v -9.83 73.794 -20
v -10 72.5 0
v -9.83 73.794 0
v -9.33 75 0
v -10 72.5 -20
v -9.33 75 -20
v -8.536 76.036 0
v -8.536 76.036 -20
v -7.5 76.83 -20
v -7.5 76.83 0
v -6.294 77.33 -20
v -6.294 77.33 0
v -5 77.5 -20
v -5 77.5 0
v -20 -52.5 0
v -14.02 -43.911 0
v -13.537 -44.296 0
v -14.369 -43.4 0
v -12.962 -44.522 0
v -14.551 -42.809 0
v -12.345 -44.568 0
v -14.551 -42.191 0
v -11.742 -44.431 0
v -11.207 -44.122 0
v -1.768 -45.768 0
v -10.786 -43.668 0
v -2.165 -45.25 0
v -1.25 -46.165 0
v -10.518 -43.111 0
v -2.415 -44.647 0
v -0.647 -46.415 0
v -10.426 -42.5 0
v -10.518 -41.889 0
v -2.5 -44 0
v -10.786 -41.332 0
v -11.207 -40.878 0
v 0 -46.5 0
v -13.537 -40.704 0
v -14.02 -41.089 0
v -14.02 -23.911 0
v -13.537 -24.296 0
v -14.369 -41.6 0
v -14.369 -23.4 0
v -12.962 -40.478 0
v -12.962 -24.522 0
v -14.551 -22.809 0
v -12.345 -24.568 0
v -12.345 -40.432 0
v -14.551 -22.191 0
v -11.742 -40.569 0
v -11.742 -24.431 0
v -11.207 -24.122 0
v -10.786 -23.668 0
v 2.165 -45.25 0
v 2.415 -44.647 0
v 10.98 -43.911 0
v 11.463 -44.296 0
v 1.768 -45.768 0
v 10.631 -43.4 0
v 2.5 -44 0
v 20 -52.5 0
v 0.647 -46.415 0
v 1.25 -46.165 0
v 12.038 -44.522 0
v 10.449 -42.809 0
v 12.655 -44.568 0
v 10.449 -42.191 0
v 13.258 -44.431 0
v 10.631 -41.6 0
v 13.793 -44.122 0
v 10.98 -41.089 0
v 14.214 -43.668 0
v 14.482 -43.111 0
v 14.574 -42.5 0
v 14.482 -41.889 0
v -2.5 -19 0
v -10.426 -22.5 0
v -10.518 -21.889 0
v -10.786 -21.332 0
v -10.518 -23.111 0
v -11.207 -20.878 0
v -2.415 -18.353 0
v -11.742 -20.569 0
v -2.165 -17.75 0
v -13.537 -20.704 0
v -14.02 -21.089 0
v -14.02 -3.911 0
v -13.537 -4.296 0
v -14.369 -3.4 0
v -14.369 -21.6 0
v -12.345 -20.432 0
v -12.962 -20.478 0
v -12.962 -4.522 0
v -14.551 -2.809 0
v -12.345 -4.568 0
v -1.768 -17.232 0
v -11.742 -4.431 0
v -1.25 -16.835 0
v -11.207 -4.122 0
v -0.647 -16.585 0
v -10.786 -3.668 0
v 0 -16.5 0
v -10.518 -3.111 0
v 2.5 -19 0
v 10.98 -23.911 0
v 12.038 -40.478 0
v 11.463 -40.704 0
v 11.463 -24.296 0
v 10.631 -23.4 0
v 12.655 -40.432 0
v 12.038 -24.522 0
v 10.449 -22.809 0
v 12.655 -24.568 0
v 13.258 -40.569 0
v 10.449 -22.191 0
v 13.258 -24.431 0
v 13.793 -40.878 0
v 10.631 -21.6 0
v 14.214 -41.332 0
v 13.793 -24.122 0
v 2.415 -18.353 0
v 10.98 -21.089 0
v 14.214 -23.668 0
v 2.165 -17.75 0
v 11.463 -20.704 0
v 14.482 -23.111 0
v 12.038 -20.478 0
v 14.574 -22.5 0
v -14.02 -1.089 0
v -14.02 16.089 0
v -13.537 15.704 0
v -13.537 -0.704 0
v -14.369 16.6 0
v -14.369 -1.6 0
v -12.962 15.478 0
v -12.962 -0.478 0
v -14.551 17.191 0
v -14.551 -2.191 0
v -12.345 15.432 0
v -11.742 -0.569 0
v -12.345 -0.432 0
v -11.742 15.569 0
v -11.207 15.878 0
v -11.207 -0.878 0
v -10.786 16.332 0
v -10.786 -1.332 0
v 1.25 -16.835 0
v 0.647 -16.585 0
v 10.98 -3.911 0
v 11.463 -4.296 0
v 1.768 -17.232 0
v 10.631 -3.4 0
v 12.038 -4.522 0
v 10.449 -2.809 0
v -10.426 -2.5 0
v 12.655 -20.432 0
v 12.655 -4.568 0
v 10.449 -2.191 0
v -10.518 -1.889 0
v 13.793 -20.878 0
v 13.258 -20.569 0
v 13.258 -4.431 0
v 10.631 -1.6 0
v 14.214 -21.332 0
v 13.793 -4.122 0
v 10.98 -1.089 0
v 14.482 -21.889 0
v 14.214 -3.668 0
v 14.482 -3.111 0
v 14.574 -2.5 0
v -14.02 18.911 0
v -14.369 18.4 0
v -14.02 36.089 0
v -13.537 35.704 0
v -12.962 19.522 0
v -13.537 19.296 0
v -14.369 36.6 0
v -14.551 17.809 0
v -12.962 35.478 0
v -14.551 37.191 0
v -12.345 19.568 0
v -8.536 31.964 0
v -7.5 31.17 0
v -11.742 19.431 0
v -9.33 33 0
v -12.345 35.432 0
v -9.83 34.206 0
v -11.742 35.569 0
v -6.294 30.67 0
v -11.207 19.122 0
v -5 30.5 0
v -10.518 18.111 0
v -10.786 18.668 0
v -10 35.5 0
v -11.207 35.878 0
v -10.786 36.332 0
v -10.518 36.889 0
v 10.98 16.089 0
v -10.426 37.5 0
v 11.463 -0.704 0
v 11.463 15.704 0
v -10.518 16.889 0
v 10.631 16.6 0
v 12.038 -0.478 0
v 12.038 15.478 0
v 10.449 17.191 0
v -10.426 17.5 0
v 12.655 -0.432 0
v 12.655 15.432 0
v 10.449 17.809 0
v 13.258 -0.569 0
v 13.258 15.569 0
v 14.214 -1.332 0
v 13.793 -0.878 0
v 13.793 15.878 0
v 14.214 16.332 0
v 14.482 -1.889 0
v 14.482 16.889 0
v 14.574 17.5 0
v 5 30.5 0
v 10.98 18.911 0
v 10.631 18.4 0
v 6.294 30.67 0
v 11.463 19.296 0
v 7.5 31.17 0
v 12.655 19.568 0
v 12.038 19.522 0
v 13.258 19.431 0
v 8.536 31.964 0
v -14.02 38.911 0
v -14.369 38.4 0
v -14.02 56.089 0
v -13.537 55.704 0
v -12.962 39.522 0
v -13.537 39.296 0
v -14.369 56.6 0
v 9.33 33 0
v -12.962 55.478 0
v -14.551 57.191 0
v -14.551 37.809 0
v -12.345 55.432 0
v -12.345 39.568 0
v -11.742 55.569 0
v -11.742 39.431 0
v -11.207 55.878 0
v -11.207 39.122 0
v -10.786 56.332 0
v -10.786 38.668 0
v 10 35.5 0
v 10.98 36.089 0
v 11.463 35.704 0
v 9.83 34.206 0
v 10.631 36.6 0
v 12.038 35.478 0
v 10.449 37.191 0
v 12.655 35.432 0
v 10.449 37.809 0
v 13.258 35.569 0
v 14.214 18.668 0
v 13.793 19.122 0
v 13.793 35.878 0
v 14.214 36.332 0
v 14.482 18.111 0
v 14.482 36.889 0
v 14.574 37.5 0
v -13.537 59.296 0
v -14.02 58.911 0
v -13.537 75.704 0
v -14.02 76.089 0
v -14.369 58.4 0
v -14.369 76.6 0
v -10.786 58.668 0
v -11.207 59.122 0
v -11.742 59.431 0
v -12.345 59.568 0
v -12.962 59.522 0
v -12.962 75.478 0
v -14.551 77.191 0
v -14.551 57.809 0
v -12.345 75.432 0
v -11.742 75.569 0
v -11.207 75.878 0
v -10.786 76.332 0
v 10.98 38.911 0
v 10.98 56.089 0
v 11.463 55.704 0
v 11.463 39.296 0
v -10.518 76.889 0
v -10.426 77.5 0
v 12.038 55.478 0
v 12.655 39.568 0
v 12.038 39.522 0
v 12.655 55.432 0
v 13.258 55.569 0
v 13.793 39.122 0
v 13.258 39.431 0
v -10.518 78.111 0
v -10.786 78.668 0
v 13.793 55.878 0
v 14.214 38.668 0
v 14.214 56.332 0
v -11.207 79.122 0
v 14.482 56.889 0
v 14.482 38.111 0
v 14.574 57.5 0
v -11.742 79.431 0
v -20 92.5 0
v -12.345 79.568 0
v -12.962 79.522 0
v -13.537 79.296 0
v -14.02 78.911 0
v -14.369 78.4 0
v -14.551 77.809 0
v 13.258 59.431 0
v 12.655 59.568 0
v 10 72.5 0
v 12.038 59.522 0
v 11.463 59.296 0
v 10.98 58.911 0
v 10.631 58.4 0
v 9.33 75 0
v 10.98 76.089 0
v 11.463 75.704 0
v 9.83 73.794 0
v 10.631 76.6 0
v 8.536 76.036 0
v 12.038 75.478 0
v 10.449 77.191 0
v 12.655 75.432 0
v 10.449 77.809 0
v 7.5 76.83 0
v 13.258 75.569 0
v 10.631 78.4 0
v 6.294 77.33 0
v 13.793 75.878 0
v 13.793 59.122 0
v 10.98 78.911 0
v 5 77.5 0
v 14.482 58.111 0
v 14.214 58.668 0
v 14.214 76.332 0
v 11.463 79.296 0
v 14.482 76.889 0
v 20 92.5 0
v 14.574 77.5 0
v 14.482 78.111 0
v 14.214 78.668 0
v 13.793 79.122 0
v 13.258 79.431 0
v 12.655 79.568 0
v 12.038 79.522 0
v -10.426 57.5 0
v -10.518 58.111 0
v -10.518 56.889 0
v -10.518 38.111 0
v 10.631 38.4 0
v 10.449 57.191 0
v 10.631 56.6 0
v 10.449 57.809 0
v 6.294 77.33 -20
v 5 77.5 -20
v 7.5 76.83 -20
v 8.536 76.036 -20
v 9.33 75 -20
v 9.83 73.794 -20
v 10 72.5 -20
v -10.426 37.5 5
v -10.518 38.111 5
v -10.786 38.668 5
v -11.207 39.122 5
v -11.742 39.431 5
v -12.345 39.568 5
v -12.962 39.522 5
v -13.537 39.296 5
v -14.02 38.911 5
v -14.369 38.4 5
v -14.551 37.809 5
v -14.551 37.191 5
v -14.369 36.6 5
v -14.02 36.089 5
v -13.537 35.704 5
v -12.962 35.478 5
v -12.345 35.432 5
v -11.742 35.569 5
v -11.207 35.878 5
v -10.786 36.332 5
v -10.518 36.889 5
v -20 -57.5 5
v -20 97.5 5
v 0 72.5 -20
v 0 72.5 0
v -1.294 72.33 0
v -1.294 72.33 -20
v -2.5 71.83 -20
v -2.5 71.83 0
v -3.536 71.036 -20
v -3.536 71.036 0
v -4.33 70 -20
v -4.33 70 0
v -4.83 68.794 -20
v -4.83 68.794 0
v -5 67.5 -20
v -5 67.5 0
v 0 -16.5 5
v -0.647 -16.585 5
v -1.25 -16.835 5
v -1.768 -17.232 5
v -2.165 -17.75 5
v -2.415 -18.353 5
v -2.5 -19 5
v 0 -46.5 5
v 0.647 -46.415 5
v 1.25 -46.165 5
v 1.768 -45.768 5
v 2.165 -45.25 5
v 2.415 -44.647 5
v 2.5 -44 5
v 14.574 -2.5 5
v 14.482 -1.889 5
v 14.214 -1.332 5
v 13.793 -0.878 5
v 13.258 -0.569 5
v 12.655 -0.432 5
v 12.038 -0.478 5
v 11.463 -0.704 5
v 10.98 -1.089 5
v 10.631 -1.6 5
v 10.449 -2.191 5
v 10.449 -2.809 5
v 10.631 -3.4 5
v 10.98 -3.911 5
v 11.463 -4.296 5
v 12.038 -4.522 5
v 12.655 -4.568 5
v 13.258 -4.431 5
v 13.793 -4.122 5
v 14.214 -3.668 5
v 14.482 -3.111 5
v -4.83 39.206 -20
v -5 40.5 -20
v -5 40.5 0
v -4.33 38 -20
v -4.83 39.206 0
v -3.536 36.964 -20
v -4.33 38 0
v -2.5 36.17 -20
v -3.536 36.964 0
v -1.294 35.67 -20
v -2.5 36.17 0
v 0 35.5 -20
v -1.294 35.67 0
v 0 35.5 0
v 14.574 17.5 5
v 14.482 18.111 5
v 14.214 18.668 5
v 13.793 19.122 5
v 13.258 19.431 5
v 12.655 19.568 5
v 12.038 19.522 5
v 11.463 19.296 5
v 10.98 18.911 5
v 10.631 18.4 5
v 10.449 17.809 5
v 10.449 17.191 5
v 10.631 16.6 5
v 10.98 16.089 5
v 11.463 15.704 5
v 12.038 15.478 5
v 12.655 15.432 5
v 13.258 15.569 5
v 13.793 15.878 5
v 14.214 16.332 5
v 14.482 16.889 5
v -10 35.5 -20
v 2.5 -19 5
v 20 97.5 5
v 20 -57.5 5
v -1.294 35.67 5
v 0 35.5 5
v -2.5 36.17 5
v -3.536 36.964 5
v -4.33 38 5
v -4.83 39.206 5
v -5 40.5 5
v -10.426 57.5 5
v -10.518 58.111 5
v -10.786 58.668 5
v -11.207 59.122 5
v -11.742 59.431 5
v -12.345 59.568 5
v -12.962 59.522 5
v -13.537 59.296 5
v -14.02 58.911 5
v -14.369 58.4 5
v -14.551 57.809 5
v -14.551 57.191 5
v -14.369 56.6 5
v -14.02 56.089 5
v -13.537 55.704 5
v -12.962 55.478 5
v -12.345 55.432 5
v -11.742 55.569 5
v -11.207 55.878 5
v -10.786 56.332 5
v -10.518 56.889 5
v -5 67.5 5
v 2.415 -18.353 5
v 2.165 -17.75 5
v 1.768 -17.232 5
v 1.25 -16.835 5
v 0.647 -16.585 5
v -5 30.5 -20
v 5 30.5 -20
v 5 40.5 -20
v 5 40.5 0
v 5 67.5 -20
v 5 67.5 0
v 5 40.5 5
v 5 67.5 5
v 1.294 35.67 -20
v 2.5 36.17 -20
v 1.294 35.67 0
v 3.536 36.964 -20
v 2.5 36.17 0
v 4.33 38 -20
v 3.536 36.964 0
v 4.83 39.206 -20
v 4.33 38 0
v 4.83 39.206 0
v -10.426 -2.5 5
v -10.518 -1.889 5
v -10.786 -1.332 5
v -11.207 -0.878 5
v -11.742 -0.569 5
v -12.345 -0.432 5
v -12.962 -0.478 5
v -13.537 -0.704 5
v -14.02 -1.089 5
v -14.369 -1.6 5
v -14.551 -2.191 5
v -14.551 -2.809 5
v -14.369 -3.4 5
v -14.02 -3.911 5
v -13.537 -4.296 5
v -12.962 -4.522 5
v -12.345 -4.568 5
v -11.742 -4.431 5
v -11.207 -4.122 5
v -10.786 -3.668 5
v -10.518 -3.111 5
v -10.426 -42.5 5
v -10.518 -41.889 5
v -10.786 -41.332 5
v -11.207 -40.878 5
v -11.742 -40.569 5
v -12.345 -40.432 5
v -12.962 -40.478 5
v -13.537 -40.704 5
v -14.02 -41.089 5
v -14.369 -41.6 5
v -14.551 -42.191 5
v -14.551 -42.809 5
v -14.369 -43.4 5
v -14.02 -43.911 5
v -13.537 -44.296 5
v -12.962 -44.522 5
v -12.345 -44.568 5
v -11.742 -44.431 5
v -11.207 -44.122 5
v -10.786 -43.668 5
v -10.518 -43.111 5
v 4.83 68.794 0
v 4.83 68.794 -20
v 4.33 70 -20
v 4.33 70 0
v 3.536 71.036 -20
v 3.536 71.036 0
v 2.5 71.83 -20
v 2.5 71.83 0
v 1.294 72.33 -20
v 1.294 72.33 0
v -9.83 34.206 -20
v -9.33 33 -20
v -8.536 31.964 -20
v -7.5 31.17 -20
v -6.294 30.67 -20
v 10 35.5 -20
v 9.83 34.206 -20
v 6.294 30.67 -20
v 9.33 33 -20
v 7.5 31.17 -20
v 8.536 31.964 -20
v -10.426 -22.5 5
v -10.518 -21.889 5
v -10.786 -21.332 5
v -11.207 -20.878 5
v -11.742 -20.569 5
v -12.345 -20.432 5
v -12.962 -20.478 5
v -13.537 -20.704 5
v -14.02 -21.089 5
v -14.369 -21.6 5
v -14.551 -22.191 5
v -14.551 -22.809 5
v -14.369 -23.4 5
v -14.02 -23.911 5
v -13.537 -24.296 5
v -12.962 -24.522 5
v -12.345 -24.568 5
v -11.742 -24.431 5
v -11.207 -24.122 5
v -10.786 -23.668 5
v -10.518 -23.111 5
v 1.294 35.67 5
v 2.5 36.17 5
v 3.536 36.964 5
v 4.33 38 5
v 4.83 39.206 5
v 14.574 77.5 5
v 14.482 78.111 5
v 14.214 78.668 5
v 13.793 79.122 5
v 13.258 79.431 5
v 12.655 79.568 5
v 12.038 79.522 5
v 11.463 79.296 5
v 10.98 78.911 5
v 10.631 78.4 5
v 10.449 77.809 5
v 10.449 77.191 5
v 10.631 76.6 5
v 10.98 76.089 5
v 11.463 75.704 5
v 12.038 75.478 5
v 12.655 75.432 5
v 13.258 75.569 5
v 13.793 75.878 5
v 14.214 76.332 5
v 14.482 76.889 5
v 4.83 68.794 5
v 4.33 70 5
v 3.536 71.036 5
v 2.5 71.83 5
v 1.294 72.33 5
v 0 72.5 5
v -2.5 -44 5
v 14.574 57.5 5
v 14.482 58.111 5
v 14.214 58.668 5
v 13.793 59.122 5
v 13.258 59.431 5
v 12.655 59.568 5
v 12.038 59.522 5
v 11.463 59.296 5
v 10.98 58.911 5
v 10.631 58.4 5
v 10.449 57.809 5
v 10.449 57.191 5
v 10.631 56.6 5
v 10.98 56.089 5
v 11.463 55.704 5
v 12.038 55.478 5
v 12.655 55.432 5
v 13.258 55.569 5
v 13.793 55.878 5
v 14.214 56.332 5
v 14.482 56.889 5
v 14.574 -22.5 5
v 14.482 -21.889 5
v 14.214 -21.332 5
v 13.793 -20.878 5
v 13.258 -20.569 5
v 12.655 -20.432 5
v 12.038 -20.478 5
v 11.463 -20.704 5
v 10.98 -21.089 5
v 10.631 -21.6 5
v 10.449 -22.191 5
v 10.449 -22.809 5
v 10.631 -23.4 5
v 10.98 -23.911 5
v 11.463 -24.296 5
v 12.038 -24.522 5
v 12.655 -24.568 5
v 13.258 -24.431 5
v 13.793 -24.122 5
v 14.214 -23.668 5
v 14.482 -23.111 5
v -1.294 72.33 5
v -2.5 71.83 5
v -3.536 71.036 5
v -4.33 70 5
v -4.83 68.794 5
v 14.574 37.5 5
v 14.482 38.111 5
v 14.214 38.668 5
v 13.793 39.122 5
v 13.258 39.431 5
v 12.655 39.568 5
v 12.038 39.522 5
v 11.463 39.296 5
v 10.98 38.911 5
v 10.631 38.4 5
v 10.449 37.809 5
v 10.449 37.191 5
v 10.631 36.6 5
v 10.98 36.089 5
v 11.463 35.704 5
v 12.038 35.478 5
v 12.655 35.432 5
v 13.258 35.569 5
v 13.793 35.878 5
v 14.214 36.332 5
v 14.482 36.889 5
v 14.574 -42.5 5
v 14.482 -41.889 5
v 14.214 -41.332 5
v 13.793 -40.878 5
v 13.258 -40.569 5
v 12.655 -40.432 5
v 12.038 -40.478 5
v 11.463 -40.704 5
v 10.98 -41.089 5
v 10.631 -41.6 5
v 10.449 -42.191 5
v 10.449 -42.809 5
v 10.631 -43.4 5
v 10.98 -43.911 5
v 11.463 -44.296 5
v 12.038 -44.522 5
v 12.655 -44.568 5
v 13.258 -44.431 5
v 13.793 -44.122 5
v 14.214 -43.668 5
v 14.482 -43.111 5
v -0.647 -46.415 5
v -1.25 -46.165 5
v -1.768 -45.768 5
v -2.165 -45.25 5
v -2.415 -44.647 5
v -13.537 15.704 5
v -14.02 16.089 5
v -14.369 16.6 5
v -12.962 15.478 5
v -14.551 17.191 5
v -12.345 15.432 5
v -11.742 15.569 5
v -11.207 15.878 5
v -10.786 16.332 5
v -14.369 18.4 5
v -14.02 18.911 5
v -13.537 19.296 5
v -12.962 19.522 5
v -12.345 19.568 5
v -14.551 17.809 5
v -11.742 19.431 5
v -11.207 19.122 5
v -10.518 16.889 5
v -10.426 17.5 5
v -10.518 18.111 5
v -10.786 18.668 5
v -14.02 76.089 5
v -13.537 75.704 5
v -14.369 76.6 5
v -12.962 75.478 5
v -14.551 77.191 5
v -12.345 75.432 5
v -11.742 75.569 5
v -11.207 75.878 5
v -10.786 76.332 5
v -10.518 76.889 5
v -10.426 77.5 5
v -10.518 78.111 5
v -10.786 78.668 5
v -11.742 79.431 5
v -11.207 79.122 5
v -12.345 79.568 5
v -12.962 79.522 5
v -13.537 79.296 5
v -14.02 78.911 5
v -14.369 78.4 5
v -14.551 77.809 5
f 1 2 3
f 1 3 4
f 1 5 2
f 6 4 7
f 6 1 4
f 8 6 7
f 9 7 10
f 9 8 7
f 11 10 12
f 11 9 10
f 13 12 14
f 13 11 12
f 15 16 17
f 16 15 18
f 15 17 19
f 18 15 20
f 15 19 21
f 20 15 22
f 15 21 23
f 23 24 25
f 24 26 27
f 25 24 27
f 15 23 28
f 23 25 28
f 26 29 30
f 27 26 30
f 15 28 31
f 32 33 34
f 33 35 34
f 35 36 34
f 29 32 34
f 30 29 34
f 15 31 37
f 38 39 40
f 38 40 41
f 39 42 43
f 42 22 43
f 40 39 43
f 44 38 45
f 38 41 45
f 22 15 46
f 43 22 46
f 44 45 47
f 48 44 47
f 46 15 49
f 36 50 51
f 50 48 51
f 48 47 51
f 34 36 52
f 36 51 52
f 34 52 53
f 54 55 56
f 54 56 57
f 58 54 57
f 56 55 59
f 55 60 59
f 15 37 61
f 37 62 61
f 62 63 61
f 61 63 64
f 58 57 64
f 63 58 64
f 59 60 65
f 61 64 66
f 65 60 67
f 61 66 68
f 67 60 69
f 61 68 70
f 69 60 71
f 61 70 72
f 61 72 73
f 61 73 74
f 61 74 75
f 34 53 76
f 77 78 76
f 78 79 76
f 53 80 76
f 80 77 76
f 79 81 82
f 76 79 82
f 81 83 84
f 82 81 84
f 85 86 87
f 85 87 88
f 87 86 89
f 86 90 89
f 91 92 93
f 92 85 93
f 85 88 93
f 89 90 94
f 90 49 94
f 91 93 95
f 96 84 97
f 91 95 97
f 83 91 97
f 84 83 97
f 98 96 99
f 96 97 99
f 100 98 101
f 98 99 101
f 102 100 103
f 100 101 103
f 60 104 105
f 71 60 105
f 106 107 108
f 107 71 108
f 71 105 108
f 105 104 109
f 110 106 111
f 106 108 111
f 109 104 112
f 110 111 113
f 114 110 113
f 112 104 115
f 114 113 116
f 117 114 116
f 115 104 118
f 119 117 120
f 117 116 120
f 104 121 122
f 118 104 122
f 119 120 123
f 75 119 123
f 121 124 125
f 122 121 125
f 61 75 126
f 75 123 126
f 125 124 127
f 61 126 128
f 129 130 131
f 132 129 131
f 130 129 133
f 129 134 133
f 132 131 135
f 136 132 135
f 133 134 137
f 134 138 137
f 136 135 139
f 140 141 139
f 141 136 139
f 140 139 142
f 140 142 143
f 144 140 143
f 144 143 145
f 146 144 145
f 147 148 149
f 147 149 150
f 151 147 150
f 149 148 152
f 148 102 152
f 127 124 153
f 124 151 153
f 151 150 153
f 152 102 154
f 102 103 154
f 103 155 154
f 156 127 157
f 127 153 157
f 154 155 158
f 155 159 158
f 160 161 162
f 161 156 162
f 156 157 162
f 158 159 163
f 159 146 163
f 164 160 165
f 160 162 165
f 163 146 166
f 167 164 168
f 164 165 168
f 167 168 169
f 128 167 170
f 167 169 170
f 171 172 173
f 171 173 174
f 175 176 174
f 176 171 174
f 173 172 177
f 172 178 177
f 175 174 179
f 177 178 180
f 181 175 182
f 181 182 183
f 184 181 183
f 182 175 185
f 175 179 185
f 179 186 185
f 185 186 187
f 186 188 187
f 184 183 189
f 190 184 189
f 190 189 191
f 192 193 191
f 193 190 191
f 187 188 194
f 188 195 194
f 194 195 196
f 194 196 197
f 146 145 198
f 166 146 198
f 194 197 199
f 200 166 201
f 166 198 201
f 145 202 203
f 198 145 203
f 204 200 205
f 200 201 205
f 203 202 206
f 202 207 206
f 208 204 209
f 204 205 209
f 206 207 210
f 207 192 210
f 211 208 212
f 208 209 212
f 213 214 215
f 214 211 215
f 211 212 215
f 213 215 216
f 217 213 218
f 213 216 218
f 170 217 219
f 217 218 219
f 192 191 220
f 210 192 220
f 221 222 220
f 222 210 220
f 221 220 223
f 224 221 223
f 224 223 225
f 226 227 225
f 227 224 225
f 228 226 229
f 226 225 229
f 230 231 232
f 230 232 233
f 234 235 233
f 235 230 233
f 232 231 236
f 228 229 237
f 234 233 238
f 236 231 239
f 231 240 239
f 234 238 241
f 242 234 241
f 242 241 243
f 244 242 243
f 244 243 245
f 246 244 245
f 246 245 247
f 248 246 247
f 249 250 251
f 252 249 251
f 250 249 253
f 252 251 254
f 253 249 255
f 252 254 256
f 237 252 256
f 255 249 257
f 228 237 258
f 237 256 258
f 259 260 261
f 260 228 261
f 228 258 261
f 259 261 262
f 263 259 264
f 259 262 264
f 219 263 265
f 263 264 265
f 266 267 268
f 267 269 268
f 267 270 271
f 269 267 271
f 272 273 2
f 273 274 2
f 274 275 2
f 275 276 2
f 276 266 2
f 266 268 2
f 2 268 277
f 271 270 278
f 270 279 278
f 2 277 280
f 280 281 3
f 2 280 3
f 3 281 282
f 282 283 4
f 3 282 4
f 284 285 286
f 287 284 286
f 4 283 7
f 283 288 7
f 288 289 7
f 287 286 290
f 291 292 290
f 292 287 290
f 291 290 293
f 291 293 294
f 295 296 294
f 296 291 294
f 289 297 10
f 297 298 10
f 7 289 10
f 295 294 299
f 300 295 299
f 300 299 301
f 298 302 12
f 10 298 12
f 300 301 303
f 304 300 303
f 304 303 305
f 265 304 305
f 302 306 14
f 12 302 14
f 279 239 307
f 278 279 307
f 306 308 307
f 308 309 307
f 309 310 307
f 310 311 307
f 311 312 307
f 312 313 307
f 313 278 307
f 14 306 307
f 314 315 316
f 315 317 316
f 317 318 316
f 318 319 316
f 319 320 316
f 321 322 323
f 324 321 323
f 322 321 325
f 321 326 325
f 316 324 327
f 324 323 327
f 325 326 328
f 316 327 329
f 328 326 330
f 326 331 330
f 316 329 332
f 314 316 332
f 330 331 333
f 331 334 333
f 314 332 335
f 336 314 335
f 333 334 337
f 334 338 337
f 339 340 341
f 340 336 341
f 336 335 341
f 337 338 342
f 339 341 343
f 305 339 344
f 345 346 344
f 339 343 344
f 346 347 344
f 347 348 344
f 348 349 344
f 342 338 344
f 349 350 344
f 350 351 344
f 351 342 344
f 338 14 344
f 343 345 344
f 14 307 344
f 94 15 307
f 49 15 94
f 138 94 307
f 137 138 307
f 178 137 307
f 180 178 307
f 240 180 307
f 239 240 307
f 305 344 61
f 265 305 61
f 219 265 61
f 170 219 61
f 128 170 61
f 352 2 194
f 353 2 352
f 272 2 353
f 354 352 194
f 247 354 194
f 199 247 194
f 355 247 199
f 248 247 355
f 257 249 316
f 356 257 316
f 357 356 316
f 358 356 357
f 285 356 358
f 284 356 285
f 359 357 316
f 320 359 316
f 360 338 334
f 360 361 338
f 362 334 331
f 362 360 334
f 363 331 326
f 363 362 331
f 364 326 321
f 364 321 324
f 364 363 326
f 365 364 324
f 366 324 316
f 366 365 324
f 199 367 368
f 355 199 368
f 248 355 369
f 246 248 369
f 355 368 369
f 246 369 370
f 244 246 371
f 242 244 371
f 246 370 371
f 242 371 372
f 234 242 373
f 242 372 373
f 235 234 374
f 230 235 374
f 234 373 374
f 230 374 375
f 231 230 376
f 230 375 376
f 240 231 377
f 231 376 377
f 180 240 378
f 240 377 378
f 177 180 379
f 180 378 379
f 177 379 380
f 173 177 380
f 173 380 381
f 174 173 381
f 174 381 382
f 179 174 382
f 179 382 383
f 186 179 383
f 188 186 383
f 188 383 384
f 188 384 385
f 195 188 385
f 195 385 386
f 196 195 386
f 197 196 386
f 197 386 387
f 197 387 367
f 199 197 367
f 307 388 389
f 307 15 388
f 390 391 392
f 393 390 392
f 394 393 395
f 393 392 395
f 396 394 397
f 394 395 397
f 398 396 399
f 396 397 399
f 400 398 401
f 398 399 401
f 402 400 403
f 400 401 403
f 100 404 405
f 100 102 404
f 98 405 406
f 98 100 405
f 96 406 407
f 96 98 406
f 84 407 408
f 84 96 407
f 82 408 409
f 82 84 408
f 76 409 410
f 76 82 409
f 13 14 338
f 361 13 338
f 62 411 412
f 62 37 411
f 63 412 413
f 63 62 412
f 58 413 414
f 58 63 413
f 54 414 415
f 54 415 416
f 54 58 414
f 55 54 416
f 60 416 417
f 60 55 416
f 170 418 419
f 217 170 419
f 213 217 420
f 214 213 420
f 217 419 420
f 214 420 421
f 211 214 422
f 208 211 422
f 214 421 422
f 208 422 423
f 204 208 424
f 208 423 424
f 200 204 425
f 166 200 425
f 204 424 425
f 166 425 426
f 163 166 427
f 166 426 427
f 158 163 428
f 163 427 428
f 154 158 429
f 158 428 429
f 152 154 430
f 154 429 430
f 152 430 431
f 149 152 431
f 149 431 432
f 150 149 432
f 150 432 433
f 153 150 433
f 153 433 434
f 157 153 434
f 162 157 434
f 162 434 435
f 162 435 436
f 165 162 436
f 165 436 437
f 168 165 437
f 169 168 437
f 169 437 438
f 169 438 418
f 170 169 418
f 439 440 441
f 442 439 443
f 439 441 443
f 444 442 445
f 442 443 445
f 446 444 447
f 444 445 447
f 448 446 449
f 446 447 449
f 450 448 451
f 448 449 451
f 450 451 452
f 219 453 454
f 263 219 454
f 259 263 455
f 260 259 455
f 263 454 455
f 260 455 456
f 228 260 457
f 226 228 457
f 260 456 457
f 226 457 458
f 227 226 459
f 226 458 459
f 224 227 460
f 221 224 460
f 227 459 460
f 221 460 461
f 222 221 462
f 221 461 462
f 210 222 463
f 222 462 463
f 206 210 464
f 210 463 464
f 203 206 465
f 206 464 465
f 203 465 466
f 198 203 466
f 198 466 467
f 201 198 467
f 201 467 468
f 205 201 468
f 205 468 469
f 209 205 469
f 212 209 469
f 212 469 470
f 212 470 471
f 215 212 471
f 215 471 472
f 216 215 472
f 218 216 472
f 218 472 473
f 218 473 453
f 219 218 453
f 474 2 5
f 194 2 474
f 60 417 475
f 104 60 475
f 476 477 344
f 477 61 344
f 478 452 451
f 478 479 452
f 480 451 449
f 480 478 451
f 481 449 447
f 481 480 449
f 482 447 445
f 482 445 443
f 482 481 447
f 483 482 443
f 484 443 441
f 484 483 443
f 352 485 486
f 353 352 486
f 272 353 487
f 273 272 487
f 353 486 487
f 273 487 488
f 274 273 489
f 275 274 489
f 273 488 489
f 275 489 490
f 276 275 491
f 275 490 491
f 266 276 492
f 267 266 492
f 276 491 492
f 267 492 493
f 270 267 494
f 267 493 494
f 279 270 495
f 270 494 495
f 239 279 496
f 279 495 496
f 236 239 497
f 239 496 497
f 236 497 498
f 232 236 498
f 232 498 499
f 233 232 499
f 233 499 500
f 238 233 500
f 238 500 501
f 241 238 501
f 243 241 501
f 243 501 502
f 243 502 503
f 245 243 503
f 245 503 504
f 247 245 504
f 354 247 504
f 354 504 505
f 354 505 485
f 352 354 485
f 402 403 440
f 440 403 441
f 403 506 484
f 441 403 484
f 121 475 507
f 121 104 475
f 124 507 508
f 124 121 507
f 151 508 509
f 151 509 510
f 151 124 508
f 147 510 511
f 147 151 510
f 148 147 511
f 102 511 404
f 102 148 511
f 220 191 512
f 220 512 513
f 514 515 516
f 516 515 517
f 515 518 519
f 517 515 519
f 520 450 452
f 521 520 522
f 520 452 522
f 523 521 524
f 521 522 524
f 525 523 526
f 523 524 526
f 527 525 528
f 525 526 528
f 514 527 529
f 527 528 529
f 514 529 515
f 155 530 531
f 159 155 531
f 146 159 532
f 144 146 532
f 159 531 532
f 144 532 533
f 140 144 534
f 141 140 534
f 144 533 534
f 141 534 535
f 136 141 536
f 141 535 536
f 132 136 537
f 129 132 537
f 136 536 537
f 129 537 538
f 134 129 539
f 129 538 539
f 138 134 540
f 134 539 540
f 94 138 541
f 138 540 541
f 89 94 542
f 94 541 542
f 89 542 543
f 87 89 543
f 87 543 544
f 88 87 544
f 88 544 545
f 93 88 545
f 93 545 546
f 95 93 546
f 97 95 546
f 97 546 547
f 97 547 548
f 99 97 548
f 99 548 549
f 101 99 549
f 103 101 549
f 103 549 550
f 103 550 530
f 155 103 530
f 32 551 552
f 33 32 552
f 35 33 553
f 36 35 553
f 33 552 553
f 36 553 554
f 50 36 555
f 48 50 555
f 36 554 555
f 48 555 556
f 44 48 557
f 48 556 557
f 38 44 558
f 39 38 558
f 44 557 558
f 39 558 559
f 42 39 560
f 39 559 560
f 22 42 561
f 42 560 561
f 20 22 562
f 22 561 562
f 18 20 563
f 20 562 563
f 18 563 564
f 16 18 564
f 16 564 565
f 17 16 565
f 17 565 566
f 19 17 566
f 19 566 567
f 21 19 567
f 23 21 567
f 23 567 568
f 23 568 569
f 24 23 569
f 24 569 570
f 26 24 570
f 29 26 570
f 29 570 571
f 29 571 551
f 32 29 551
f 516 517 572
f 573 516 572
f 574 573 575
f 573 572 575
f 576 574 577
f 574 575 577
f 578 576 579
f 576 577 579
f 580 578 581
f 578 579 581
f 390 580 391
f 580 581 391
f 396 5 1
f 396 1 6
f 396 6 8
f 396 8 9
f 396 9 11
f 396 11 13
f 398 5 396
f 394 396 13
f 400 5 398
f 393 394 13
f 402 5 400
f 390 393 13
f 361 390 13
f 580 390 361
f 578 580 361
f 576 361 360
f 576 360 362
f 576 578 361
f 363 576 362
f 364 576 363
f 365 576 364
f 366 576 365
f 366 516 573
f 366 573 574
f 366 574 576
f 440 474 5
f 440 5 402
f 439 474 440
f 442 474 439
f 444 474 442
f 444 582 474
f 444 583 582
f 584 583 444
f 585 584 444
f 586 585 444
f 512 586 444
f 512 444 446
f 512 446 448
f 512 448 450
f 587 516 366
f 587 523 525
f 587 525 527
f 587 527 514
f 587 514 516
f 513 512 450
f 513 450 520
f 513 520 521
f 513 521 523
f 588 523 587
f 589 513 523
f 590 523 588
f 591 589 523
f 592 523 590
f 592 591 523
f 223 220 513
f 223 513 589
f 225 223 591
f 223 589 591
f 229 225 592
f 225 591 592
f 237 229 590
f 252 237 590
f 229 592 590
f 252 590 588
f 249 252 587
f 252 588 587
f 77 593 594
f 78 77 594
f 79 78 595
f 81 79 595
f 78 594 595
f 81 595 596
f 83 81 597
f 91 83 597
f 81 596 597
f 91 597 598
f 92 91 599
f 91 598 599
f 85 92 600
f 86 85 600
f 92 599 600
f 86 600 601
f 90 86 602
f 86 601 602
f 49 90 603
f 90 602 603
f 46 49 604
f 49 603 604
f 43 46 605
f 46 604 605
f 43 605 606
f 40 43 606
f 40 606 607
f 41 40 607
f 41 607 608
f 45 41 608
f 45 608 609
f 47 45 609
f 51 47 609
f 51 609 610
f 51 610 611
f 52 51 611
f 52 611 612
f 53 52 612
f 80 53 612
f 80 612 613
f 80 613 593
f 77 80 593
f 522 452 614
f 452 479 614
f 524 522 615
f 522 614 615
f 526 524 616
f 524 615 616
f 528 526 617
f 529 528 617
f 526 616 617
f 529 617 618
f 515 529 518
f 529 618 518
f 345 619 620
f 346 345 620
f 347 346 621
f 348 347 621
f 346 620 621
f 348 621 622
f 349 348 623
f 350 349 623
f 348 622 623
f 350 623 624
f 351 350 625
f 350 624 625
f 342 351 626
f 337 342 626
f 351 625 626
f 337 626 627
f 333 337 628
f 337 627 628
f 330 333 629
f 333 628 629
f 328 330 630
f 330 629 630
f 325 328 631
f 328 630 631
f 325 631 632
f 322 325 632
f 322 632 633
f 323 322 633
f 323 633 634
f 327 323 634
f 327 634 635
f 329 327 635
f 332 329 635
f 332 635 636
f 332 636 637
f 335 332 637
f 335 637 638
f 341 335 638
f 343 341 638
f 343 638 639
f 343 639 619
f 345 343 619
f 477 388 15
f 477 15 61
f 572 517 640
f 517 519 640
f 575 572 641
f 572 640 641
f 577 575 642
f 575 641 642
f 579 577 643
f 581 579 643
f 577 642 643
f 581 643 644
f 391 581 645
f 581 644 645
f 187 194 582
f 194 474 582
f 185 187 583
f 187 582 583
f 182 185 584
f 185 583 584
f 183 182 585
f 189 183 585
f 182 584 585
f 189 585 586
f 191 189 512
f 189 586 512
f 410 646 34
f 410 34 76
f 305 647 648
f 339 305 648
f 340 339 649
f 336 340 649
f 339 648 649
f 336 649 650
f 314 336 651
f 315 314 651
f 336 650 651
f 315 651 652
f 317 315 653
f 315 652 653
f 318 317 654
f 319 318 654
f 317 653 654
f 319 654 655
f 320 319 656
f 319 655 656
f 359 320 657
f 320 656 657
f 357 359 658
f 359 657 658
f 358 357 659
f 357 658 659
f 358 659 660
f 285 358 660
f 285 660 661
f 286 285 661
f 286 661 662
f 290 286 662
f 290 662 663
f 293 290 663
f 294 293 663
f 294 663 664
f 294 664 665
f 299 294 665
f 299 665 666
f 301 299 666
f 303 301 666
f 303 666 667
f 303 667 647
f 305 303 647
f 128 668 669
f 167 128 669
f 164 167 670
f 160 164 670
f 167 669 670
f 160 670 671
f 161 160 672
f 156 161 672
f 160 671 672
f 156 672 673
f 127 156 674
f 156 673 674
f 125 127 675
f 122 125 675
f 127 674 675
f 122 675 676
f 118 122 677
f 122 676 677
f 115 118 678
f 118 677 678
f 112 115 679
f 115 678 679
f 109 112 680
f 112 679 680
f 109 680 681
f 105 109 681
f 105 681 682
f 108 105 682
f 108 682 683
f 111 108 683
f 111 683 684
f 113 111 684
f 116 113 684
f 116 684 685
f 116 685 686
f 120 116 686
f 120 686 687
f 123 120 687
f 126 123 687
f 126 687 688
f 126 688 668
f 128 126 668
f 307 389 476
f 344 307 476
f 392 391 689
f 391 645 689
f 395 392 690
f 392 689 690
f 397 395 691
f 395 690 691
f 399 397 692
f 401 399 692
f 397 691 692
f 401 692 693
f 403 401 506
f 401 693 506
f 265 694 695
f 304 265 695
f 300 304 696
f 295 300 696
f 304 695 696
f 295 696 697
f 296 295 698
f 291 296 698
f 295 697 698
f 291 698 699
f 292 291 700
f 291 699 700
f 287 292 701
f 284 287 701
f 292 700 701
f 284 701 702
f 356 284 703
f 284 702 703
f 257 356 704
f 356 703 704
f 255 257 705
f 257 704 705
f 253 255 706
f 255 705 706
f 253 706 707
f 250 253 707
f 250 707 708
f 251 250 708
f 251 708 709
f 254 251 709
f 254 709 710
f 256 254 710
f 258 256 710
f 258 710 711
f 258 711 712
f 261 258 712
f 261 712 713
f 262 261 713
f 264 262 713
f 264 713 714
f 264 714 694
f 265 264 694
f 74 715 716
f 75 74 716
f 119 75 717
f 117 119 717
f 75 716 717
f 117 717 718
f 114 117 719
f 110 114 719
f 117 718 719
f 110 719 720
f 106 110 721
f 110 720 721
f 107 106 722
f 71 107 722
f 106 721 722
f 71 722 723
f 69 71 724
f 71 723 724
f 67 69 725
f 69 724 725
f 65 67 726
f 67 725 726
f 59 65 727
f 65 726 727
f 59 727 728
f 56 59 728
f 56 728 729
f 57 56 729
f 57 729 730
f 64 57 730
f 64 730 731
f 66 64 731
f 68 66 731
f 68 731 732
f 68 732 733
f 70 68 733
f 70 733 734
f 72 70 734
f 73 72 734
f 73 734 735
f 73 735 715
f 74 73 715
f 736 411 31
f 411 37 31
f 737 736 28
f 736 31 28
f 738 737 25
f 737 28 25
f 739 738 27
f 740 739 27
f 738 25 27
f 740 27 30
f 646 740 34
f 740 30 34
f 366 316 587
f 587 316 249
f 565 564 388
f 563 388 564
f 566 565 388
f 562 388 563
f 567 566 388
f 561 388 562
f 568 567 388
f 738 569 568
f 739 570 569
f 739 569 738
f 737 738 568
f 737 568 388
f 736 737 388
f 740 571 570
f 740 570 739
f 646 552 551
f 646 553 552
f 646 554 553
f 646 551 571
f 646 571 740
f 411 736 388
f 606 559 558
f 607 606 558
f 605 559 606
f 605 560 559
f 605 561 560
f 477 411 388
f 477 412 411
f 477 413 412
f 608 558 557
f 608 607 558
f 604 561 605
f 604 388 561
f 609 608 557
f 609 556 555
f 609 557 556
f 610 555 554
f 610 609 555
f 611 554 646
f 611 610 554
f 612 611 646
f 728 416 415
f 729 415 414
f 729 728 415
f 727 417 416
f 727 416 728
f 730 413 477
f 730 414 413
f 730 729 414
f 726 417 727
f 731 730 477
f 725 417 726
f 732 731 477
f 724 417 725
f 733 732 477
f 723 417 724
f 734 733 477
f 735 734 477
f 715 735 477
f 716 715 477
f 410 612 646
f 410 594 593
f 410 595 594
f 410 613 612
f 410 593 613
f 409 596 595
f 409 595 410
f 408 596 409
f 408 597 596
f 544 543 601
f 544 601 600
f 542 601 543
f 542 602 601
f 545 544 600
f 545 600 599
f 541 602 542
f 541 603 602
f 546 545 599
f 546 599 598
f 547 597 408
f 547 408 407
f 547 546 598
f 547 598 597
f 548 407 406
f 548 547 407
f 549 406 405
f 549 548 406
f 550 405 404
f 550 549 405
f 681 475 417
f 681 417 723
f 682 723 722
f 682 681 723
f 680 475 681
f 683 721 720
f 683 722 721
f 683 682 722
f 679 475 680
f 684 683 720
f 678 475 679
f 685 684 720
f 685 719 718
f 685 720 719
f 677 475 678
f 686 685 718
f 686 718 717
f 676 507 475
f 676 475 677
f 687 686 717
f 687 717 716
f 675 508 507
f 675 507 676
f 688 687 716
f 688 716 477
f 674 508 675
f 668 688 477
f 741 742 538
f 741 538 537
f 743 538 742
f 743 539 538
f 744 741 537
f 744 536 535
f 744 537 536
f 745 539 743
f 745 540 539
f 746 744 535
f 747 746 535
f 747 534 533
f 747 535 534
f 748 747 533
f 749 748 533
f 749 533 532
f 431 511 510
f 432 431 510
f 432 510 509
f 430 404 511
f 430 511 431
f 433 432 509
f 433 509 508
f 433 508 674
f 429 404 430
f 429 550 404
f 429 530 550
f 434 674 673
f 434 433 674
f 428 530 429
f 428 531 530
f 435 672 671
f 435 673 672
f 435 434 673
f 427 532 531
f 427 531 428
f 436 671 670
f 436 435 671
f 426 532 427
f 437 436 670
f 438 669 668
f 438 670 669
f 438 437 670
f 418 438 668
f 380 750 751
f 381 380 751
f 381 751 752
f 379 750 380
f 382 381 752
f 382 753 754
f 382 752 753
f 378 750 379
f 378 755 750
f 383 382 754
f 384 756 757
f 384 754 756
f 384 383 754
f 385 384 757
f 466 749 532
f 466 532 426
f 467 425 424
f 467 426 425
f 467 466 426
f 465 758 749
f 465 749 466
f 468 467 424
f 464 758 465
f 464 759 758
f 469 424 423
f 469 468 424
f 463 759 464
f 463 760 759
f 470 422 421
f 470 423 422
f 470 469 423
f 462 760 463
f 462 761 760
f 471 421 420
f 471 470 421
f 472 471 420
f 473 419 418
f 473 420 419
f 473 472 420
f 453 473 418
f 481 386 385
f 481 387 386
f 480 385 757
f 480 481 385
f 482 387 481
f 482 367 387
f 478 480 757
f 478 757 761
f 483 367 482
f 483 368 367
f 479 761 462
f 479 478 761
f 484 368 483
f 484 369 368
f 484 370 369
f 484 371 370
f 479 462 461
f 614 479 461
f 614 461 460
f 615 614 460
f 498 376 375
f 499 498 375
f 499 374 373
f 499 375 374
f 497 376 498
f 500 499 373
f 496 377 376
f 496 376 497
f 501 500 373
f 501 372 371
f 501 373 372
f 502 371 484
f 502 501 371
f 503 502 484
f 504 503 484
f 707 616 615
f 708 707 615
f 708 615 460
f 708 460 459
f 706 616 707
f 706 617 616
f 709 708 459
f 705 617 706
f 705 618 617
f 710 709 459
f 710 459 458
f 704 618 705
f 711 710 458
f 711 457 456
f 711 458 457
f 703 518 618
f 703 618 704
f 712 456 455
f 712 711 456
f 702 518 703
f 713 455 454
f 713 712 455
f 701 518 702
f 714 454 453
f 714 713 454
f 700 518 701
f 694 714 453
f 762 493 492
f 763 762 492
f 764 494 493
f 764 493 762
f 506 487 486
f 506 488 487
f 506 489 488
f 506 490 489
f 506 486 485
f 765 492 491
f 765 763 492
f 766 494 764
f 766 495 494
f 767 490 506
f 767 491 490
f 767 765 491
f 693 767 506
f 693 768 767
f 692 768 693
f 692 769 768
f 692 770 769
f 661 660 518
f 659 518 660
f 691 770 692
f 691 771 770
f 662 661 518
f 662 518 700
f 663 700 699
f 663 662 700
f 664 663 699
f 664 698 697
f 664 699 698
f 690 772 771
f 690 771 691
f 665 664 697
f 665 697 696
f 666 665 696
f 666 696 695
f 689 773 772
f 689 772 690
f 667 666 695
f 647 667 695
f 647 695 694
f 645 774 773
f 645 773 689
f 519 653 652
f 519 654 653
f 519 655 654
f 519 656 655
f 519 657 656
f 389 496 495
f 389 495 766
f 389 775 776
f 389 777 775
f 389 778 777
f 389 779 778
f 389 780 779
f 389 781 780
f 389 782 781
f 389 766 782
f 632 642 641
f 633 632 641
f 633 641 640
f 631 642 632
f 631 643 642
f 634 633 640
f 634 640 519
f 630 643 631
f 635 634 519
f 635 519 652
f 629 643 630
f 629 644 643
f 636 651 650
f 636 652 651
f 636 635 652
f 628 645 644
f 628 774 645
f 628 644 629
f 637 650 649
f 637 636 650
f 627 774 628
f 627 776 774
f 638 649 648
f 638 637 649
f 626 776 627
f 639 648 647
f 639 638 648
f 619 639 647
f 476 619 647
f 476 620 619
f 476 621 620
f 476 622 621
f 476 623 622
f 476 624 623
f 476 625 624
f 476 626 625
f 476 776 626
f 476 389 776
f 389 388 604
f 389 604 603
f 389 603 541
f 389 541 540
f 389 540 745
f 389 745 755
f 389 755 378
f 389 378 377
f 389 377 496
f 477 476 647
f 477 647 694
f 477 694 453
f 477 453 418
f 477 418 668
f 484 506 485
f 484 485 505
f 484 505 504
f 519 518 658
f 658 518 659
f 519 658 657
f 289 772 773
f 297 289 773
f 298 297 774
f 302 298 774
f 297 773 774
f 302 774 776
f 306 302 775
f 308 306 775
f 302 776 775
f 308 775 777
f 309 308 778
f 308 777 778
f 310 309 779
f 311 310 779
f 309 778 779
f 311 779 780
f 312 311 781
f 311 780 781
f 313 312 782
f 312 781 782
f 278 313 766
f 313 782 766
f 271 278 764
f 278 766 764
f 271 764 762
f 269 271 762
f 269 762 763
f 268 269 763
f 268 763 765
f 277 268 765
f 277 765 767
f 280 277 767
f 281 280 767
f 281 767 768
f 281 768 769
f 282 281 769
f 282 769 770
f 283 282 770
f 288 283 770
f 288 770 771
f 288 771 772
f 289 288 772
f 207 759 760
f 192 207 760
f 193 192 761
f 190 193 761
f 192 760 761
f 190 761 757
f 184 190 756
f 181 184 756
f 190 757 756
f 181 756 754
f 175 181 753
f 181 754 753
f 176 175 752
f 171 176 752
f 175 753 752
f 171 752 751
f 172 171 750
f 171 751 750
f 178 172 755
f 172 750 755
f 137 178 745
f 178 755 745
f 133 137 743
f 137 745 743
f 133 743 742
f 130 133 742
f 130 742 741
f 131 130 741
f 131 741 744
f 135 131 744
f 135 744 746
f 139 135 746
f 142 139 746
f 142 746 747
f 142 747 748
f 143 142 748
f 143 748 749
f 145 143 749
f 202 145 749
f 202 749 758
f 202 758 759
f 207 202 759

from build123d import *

# Parameters (mm, degrees)
F0_W      = 40
F0_H      = 155
F0_W_2    = 10
F0_H_2    = 37
F1_DEPTH  = 5
F2_R      = 4.99999
F3_W      = 20
F3_H      = 47
F4_DEPTH  = 20
F5_R      = 5
F6_SIZE   = 4.99999
F7_R      = 2.074
F8_DEPTH  = 25.001
F9_W      = 5
F9_H      = 30
F10_DEPTH = 25.001
F11_R     = 2.49999


# Not quite as in the source:
# - a fillet or chamfer is up to 0.001 mm smaller than in the source, because OpenCascade refuses the exact size
# - ends of sketch curves that miss each other by under 0.0002 mm in the source are joined


with BuildPart() as f1:
    # F0 (on Top) → F1 (new body)
    with BuildSketch(Plane.XY):
        with Locations((0, 20)):
            Rectangle(F0_W, F0_H)
        with Locations((0, 54)):
            Rectangle(F0_W_2, F0_H_2, mode=Mode.SUBTRACT)
    extrude(amount=F1_DEPTH)

    # F2 (radius 5 in the source; OpenCascade refuses exactly that, so slightly less here)
    f2_edges = [f1.edges().sort_by_distance(p)[0] for p in [
        (5, 72.5, 2.5),
        (-5, 72.5, 2.5),
        (5, 35.5, 2.5),
        (-5, 35.5, 2.5),
    ]]
    fillet(f2_edges, radius=F2_R)

    # F3 (on face) → F4 (join)
    with BuildSketch(Plane(origin=(0, 0, 0), x_dir=(1, 0, 0), z_dir=(0, 0, -1))):
        with Locations((0, -54)):
            Rectangle(F3_W, F3_H)
        with BuildLine():
            ThreePointArc((-1e-05, -72.5), (-3.5355368349, -71.0355368349), (-5, -67.50001))
            Line((-5, -67.50001), (-5, -40.49999))
            ThreePointArc((-5, -40.49999), (-3.5355368349, -36.9644631651), (-1e-05, -35.5))
            ThreePointArc((-1e-05, -35.5), (3.5355368349, -36.9644631651), (5, -40.49999))
            Line((5, -40.49999), (5, -67.50001))
            ThreePointArc((5, -67.50001), (3.5355368349, -71.0355368349), (-1e-05, -72.5))
        make_face(mode=Mode.SUBTRACT)
    extrude(amount=F4_DEPTH)

    # F5
    f5_edges = [f1.edges().sort_by_distance(p)[0] for p in [
        (-10, 30.5, -10),
        (10, 30.5, -10),
        (-10, 77.5, -10),
        (10, 77.5, -10),
    ]]
    fillet(f5_edges, radius=F5_R)

    # F6 (size 5 in the source; OpenCascade refuses exactly that, so slightly less here)
    f6_edges = [f1.edges().sort_by_distance(p)[0] for p in [
        (0, 97.5, 0),
        (0, -57.5, 0),
    ]]
    chamfer(f6_edges, length=F6_SIZE)

    # F7 (on face) → F8 (cut, through all)
    with BuildSketch(Plane.XY.offset(5)):
        with Locations((-12.5, -42.5)):
            Circle(F7_R)
        with Locations((12.5, -42.5)):
            Circle(F7_R)
        with Locations((-12.5, -22.5)):
            Circle(F7_R)
        with Locations((12.5, -22.5)):
            Circle(F7_R)
        with Locations((-12.5, -2.5)):
            Circle(F7_R)
        with Locations((12.5, -2.5)):
            Circle(F7_R)
        with Locations((-12.5, 17.5)):
            Circle(F7_R)
        with Locations((12.5, 17.5)):
            Circle(F7_R)
        with Locations((-12.5, 37.5)):
            Circle(F7_R)
        with Locations((12.5, 37.5)):
            Circle(F7_R)
        with Locations((12.5, 57.5)):
            Circle(F7_R)
        with Locations((-12.5, 57.5)):
            Circle(F7_R)
        with Locations((12.5, 77.5)):
            Circle(F7_R)
        with Locations((-12.5, 77.5)):
            Circle(F7_R)
    extrude(amount=-F8_DEPTH, mode=Mode.SUBTRACT)

    # F9 (on face) → F10 (cut, through all)
    with BuildSketch(Plane.XY.offset(5)):
        with Locations((0, -31.5)):
            Rectangle(F9_W, F9_H)
    extrude(amount=-F10_DEPTH, mode=Mode.SUBTRACT)

    # F11 (radius 2.5 in the source; OpenCascade refuses exactly that, so slightly less here)
    f11_edges = [f1.edges().sort_by_distance(p)[0] for p in [
        (-2.5, -46.5, 2.5),
        (2.5, -46.5, 2.5),
        (-2.5, -16.5, 2.5),
        (2.5, -16.5, 2.5),
    ]]
    fillet(f11_edges, radius=F11_R)


solid = f1.part
